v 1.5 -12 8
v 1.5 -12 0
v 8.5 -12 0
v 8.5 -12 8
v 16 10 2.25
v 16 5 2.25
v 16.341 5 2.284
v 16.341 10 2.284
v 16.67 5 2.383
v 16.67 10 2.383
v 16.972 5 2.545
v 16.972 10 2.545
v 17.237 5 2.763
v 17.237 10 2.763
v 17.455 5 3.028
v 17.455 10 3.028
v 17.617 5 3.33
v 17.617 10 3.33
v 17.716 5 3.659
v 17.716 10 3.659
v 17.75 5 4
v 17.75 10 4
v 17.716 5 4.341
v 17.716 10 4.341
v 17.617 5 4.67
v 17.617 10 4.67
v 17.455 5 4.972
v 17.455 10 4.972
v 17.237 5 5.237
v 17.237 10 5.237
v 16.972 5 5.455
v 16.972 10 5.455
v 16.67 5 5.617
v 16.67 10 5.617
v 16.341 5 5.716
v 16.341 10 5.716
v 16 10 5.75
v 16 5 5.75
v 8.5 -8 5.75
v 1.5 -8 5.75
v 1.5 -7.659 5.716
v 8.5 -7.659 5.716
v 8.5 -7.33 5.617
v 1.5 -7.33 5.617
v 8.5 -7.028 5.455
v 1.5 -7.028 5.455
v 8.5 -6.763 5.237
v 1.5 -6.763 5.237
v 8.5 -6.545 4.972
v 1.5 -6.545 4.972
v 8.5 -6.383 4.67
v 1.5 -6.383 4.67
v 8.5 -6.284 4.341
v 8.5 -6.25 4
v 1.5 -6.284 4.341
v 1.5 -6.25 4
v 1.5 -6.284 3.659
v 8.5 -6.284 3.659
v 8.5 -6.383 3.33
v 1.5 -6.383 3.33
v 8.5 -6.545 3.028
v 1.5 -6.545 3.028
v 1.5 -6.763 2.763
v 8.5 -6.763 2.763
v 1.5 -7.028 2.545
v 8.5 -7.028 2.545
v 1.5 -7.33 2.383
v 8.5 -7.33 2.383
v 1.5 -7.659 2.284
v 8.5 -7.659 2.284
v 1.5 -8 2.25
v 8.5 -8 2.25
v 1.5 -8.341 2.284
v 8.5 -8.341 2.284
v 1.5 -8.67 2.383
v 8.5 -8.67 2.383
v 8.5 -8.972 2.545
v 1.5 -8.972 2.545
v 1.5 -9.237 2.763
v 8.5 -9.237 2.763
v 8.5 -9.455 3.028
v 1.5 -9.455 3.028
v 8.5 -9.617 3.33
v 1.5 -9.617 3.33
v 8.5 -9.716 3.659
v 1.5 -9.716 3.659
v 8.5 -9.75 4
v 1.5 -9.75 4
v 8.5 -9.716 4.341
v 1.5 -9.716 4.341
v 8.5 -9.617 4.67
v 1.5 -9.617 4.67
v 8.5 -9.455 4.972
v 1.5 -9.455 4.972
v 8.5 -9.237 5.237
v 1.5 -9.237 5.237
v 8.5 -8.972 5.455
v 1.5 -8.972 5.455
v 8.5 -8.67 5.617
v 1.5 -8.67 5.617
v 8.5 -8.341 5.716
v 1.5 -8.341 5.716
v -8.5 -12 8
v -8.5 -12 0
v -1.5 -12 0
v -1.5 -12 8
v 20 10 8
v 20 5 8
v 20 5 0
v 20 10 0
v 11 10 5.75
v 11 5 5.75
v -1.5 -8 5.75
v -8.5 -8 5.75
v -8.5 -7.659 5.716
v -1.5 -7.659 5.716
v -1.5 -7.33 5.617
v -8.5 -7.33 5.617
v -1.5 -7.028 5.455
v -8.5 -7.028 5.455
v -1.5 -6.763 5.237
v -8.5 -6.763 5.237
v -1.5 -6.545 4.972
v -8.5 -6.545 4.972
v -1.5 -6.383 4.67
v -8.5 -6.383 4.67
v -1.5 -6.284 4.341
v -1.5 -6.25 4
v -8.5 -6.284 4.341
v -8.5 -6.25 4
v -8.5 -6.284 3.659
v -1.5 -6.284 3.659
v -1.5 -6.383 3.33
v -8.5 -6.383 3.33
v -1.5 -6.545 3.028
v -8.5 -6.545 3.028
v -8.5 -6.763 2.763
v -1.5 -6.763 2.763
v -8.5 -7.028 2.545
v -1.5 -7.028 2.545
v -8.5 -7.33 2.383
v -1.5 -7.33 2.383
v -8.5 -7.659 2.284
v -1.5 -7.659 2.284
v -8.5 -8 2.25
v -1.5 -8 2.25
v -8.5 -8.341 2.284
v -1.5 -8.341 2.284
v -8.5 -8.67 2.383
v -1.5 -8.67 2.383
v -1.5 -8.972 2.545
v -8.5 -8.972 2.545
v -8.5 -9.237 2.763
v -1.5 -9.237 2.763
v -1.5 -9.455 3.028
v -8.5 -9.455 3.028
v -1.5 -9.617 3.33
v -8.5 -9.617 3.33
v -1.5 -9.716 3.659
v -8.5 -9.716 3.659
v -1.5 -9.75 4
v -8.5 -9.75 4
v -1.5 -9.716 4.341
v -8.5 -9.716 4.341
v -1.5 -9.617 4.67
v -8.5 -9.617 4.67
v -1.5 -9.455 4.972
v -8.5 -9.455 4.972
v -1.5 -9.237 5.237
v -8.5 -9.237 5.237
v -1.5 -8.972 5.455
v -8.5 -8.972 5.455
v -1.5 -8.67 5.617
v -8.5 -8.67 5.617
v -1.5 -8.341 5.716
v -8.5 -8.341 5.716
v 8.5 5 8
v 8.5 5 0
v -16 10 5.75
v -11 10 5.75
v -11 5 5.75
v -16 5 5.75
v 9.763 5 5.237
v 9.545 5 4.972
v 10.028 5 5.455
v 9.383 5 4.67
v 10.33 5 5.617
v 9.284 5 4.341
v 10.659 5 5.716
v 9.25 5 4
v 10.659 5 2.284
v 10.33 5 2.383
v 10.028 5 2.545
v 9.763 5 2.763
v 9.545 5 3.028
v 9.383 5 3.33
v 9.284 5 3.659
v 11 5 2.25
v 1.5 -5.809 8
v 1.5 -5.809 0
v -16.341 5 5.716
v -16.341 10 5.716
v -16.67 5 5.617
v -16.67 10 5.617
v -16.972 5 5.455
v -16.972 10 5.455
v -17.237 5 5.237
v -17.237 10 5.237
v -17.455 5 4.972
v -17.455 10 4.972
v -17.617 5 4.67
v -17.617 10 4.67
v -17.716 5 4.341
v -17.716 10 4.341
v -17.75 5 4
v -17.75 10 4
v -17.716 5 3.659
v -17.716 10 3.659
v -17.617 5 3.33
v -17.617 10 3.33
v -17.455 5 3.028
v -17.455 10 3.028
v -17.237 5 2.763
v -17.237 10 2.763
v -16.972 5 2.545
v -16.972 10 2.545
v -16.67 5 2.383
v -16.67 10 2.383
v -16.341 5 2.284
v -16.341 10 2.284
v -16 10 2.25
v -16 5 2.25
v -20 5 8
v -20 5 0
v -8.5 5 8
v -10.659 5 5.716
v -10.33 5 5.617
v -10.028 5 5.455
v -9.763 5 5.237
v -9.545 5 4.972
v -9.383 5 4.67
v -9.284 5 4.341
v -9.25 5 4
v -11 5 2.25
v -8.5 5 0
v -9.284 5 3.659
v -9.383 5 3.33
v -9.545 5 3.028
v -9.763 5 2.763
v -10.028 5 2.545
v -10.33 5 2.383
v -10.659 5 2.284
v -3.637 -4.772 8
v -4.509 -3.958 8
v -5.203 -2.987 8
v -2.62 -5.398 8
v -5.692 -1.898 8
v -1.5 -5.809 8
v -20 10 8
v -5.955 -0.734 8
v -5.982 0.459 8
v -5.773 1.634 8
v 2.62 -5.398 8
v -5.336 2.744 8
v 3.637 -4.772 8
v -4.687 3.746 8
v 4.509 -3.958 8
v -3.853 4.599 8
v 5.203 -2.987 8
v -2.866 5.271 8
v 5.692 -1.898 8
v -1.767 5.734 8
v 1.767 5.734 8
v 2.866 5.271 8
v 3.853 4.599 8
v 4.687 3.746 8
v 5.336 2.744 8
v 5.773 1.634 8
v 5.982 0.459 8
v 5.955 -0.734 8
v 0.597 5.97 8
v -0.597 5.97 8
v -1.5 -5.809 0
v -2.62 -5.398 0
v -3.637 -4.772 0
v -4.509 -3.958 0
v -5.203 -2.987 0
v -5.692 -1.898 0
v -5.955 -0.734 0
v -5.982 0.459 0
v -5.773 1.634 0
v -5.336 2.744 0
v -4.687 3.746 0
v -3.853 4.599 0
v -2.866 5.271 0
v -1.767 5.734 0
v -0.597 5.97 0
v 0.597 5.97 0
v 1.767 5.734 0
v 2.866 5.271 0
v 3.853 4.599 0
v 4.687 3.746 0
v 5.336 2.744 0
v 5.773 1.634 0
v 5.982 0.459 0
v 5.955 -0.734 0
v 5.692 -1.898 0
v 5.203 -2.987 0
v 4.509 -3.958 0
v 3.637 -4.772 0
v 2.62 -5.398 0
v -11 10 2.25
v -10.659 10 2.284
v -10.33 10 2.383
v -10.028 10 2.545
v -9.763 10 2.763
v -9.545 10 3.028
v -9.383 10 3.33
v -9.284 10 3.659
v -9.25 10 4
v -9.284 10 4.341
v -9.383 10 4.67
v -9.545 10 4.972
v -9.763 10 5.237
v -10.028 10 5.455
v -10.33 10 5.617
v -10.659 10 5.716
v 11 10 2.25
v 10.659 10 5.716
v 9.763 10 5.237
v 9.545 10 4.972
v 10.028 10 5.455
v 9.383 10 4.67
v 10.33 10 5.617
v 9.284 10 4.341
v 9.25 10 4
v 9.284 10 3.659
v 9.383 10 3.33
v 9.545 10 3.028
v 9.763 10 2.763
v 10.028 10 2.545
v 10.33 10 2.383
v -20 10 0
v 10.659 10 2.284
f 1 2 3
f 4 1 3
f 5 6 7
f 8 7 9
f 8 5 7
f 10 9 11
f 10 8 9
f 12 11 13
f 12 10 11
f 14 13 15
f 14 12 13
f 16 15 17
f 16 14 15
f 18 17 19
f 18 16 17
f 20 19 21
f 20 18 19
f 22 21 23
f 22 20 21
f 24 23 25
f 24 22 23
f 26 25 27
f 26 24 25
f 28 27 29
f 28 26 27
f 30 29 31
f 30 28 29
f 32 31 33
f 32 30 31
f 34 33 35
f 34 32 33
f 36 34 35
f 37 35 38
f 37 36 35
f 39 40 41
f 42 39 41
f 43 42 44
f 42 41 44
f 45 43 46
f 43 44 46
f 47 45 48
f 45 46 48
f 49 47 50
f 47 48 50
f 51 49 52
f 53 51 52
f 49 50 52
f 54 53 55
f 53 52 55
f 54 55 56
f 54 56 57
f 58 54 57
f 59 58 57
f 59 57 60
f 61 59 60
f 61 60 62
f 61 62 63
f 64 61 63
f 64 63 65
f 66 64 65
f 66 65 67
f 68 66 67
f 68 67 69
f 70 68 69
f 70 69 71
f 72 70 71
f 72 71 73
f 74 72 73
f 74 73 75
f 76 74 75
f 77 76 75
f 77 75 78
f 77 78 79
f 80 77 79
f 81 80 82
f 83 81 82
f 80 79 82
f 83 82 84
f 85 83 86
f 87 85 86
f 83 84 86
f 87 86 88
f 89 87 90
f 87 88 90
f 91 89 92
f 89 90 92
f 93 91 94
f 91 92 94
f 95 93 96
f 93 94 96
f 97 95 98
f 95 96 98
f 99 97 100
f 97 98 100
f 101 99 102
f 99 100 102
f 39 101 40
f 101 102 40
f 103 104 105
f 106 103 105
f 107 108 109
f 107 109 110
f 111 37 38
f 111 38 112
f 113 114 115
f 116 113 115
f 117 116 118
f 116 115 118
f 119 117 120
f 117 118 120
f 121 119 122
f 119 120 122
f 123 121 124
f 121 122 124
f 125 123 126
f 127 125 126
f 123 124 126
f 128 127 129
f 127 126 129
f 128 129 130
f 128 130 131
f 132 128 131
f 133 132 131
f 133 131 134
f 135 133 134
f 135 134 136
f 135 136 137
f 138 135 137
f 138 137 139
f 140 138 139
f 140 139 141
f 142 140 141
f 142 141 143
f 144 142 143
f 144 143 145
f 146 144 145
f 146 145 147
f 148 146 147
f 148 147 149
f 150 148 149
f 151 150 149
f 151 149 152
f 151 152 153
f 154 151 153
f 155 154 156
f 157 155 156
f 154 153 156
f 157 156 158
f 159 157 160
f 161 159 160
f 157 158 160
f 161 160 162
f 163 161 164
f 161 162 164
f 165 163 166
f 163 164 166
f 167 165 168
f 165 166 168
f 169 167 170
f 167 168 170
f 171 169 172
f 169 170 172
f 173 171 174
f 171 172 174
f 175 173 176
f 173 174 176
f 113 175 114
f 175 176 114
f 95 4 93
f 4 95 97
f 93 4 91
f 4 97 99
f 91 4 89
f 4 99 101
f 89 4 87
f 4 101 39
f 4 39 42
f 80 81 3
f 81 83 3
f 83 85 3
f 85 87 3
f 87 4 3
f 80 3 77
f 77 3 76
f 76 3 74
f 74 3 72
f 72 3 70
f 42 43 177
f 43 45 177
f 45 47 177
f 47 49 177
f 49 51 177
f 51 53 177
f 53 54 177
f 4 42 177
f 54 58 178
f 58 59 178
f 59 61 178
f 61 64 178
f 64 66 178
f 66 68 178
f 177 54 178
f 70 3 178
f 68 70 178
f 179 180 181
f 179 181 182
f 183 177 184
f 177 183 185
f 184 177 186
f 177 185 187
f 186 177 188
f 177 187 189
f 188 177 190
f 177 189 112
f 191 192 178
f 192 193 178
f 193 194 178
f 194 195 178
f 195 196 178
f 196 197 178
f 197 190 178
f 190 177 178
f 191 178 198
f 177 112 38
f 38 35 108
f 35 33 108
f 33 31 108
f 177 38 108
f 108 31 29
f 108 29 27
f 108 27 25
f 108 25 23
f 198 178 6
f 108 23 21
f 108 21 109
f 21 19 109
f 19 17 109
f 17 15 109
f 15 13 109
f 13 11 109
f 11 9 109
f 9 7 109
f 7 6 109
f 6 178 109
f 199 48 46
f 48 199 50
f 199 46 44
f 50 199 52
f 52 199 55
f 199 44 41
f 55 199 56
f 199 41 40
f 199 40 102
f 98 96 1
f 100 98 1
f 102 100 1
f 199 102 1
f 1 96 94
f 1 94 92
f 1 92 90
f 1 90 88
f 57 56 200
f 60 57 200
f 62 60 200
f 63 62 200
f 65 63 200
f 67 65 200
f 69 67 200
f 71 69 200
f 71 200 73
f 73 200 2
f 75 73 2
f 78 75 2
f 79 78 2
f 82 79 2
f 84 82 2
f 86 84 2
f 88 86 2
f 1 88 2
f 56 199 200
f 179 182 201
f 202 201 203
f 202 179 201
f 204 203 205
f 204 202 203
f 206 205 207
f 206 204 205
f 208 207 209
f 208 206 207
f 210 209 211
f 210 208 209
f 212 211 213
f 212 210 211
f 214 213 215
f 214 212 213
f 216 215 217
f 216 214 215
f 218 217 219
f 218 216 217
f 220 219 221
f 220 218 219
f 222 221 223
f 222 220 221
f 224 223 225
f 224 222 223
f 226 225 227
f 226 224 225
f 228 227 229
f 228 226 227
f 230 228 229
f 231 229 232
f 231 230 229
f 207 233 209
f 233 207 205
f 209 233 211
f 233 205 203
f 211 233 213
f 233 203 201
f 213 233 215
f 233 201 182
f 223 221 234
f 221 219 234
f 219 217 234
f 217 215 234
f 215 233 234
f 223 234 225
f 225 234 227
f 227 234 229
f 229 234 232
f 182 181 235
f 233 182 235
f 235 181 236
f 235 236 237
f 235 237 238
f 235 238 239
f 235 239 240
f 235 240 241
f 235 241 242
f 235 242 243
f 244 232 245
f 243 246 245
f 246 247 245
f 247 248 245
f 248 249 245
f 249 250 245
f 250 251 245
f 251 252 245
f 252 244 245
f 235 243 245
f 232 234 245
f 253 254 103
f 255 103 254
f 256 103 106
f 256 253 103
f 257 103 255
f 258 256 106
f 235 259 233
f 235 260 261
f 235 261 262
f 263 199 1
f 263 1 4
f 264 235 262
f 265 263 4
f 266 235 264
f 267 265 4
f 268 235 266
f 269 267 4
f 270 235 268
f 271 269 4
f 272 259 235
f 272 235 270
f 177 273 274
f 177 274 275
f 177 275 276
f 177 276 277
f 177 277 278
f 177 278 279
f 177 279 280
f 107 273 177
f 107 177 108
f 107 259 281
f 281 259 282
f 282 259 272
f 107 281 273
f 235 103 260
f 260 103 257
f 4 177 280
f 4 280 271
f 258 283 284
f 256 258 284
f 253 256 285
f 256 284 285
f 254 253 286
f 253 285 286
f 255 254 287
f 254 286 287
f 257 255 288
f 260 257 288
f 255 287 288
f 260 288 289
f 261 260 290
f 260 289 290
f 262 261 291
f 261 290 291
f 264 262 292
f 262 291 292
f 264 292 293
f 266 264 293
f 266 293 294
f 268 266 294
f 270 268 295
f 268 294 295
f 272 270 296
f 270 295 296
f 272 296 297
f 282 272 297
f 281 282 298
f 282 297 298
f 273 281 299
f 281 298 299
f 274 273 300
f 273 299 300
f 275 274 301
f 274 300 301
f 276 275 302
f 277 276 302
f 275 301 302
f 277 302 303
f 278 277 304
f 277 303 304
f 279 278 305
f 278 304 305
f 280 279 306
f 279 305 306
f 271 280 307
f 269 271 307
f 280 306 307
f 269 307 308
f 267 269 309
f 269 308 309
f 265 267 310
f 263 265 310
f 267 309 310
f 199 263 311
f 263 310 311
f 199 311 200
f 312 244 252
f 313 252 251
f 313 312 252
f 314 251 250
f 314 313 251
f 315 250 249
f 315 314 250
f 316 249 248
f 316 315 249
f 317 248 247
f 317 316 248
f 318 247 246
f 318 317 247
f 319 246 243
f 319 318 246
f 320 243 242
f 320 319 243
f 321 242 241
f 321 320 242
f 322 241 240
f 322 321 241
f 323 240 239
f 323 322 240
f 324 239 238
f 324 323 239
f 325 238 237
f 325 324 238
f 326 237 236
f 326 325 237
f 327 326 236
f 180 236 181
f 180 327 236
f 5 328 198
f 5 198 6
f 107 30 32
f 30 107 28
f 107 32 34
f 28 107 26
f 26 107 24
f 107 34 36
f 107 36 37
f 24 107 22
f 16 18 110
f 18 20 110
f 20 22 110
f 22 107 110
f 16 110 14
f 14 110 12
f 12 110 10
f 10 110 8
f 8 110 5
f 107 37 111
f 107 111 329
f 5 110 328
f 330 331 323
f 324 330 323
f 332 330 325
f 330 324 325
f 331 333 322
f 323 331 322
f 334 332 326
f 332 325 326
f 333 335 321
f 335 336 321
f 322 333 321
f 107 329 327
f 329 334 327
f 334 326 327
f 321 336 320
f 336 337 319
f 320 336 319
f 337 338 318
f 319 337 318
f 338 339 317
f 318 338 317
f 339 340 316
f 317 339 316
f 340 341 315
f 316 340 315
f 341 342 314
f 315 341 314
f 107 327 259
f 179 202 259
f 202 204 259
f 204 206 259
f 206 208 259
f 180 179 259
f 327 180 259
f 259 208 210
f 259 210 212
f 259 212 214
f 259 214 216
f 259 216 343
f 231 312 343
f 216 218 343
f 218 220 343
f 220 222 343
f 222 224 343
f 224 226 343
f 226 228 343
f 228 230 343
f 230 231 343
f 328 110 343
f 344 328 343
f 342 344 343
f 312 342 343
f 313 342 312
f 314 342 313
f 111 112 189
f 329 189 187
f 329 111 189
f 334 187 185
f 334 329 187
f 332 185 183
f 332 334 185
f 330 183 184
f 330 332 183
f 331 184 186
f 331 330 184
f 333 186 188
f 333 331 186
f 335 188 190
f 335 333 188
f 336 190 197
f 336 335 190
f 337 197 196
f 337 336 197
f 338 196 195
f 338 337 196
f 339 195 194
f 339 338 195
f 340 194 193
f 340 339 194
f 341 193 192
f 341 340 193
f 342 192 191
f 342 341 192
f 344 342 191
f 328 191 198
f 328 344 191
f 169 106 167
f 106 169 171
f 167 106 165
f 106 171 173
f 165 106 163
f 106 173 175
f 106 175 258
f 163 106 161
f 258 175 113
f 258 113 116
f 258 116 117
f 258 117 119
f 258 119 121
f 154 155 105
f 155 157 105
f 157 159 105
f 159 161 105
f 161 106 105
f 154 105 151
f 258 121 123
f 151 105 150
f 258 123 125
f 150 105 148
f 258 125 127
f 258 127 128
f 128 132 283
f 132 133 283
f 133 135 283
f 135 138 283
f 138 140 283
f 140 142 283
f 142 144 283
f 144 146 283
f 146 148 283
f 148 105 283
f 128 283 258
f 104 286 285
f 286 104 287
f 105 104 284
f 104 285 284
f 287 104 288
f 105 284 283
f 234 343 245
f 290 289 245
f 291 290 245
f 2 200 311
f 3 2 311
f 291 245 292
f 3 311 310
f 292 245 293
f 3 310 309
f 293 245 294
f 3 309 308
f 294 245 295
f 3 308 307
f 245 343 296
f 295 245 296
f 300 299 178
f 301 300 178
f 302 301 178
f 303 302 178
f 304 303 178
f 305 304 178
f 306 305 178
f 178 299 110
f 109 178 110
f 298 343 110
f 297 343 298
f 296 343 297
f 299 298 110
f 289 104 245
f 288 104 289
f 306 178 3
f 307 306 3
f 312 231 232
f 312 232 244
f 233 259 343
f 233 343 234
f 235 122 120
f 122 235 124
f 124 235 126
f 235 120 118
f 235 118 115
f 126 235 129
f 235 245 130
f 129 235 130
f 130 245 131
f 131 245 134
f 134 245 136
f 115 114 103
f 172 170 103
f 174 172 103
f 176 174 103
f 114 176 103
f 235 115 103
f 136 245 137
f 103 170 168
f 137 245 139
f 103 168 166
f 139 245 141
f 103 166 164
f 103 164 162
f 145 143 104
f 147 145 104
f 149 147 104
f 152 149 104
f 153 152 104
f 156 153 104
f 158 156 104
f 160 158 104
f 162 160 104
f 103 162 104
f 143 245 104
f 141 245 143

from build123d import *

# Parameters (mm, degrees)
EXTRUDE_1_DEPTH     = 8
CUT_EXTRUDE_1_DEPTH = 8
SKETCH_3_R          = 1.75
CUT_EXTRUDE_2_DEPTH = 26


with BuildPart() as part:
    # 草图1 → 凸台-拉伸1 (new body)
    with BuildSketch(Plane.XY):
        with BuildLine():
            Line((20, 10), (-20, 10))
            Line((-20, 10), (-20, 5))
            Line((-20, 5), (-8.5, 5))
            Line((-8.5, 5), (-8.5, -12))
            Line((-8.5, -12), (-1.5, -12))
            Line((-1.5, -12), (-1.5, -5.809475019))
            ThreePointArc((-1.5, -5.809475019), (0, 6), (1.5, -5.809475019))
            Line((1.5, -5.809475019), (1.5, -12))
            Line((1.5, -12), (8.5, -12))
            Line((8.5, -12), (8.5, 5))
            Line((8.5, 5), (20, 5))
            Line((20, 5), (20, 10))
        make_face()
    extrude(amount=EXTRUDE_1_DEPTH)

    # 草图2 → 切除-拉伸1 (cut)
    with BuildSketch(Plane(origin=(0, 10, 0), x_dir=(1, 0, 0), z_dir=(0, 1, 0))):
        with BuildLine():
            Line((-16, -2.25), (-11, -2.25))
            ThreePointArc((-11, -2.25), (-9.25, -4), (-11, -5.75))
            Line((-11, -5.75), (-16, -5.75))
            ThreePointArc((-16, -5.75), (-17.75, -4), (-16, -2.25))
        make_face()
        with BuildLine():
            Line((16, -5.75), (11, -5.75))
            ThreePointArc((11, -5.75), (9.25, -4), (11, -2.25))
            Line((11, -2.25), (16, -2.25))
            ThreePointArc((16, -2.25), (17.75, -4), (16, -5.75))
        make_face()
    extrude(amount=-CUT_EXTRUDE_1_DEPTH, mode=Mode.SUBTRACT)

    # 草图3 → 切除-拉伸2 (cut)
    with BuildSketch(Plane.ZY.offset(8.5)):
        with Locations((4, -8)):
            Circle(SKETCH_3_R)
    extrude(amount=-CUT_EXTRUDE_2_DEPTH, mode=Mode.SUBTRACT)


solid = part.part
